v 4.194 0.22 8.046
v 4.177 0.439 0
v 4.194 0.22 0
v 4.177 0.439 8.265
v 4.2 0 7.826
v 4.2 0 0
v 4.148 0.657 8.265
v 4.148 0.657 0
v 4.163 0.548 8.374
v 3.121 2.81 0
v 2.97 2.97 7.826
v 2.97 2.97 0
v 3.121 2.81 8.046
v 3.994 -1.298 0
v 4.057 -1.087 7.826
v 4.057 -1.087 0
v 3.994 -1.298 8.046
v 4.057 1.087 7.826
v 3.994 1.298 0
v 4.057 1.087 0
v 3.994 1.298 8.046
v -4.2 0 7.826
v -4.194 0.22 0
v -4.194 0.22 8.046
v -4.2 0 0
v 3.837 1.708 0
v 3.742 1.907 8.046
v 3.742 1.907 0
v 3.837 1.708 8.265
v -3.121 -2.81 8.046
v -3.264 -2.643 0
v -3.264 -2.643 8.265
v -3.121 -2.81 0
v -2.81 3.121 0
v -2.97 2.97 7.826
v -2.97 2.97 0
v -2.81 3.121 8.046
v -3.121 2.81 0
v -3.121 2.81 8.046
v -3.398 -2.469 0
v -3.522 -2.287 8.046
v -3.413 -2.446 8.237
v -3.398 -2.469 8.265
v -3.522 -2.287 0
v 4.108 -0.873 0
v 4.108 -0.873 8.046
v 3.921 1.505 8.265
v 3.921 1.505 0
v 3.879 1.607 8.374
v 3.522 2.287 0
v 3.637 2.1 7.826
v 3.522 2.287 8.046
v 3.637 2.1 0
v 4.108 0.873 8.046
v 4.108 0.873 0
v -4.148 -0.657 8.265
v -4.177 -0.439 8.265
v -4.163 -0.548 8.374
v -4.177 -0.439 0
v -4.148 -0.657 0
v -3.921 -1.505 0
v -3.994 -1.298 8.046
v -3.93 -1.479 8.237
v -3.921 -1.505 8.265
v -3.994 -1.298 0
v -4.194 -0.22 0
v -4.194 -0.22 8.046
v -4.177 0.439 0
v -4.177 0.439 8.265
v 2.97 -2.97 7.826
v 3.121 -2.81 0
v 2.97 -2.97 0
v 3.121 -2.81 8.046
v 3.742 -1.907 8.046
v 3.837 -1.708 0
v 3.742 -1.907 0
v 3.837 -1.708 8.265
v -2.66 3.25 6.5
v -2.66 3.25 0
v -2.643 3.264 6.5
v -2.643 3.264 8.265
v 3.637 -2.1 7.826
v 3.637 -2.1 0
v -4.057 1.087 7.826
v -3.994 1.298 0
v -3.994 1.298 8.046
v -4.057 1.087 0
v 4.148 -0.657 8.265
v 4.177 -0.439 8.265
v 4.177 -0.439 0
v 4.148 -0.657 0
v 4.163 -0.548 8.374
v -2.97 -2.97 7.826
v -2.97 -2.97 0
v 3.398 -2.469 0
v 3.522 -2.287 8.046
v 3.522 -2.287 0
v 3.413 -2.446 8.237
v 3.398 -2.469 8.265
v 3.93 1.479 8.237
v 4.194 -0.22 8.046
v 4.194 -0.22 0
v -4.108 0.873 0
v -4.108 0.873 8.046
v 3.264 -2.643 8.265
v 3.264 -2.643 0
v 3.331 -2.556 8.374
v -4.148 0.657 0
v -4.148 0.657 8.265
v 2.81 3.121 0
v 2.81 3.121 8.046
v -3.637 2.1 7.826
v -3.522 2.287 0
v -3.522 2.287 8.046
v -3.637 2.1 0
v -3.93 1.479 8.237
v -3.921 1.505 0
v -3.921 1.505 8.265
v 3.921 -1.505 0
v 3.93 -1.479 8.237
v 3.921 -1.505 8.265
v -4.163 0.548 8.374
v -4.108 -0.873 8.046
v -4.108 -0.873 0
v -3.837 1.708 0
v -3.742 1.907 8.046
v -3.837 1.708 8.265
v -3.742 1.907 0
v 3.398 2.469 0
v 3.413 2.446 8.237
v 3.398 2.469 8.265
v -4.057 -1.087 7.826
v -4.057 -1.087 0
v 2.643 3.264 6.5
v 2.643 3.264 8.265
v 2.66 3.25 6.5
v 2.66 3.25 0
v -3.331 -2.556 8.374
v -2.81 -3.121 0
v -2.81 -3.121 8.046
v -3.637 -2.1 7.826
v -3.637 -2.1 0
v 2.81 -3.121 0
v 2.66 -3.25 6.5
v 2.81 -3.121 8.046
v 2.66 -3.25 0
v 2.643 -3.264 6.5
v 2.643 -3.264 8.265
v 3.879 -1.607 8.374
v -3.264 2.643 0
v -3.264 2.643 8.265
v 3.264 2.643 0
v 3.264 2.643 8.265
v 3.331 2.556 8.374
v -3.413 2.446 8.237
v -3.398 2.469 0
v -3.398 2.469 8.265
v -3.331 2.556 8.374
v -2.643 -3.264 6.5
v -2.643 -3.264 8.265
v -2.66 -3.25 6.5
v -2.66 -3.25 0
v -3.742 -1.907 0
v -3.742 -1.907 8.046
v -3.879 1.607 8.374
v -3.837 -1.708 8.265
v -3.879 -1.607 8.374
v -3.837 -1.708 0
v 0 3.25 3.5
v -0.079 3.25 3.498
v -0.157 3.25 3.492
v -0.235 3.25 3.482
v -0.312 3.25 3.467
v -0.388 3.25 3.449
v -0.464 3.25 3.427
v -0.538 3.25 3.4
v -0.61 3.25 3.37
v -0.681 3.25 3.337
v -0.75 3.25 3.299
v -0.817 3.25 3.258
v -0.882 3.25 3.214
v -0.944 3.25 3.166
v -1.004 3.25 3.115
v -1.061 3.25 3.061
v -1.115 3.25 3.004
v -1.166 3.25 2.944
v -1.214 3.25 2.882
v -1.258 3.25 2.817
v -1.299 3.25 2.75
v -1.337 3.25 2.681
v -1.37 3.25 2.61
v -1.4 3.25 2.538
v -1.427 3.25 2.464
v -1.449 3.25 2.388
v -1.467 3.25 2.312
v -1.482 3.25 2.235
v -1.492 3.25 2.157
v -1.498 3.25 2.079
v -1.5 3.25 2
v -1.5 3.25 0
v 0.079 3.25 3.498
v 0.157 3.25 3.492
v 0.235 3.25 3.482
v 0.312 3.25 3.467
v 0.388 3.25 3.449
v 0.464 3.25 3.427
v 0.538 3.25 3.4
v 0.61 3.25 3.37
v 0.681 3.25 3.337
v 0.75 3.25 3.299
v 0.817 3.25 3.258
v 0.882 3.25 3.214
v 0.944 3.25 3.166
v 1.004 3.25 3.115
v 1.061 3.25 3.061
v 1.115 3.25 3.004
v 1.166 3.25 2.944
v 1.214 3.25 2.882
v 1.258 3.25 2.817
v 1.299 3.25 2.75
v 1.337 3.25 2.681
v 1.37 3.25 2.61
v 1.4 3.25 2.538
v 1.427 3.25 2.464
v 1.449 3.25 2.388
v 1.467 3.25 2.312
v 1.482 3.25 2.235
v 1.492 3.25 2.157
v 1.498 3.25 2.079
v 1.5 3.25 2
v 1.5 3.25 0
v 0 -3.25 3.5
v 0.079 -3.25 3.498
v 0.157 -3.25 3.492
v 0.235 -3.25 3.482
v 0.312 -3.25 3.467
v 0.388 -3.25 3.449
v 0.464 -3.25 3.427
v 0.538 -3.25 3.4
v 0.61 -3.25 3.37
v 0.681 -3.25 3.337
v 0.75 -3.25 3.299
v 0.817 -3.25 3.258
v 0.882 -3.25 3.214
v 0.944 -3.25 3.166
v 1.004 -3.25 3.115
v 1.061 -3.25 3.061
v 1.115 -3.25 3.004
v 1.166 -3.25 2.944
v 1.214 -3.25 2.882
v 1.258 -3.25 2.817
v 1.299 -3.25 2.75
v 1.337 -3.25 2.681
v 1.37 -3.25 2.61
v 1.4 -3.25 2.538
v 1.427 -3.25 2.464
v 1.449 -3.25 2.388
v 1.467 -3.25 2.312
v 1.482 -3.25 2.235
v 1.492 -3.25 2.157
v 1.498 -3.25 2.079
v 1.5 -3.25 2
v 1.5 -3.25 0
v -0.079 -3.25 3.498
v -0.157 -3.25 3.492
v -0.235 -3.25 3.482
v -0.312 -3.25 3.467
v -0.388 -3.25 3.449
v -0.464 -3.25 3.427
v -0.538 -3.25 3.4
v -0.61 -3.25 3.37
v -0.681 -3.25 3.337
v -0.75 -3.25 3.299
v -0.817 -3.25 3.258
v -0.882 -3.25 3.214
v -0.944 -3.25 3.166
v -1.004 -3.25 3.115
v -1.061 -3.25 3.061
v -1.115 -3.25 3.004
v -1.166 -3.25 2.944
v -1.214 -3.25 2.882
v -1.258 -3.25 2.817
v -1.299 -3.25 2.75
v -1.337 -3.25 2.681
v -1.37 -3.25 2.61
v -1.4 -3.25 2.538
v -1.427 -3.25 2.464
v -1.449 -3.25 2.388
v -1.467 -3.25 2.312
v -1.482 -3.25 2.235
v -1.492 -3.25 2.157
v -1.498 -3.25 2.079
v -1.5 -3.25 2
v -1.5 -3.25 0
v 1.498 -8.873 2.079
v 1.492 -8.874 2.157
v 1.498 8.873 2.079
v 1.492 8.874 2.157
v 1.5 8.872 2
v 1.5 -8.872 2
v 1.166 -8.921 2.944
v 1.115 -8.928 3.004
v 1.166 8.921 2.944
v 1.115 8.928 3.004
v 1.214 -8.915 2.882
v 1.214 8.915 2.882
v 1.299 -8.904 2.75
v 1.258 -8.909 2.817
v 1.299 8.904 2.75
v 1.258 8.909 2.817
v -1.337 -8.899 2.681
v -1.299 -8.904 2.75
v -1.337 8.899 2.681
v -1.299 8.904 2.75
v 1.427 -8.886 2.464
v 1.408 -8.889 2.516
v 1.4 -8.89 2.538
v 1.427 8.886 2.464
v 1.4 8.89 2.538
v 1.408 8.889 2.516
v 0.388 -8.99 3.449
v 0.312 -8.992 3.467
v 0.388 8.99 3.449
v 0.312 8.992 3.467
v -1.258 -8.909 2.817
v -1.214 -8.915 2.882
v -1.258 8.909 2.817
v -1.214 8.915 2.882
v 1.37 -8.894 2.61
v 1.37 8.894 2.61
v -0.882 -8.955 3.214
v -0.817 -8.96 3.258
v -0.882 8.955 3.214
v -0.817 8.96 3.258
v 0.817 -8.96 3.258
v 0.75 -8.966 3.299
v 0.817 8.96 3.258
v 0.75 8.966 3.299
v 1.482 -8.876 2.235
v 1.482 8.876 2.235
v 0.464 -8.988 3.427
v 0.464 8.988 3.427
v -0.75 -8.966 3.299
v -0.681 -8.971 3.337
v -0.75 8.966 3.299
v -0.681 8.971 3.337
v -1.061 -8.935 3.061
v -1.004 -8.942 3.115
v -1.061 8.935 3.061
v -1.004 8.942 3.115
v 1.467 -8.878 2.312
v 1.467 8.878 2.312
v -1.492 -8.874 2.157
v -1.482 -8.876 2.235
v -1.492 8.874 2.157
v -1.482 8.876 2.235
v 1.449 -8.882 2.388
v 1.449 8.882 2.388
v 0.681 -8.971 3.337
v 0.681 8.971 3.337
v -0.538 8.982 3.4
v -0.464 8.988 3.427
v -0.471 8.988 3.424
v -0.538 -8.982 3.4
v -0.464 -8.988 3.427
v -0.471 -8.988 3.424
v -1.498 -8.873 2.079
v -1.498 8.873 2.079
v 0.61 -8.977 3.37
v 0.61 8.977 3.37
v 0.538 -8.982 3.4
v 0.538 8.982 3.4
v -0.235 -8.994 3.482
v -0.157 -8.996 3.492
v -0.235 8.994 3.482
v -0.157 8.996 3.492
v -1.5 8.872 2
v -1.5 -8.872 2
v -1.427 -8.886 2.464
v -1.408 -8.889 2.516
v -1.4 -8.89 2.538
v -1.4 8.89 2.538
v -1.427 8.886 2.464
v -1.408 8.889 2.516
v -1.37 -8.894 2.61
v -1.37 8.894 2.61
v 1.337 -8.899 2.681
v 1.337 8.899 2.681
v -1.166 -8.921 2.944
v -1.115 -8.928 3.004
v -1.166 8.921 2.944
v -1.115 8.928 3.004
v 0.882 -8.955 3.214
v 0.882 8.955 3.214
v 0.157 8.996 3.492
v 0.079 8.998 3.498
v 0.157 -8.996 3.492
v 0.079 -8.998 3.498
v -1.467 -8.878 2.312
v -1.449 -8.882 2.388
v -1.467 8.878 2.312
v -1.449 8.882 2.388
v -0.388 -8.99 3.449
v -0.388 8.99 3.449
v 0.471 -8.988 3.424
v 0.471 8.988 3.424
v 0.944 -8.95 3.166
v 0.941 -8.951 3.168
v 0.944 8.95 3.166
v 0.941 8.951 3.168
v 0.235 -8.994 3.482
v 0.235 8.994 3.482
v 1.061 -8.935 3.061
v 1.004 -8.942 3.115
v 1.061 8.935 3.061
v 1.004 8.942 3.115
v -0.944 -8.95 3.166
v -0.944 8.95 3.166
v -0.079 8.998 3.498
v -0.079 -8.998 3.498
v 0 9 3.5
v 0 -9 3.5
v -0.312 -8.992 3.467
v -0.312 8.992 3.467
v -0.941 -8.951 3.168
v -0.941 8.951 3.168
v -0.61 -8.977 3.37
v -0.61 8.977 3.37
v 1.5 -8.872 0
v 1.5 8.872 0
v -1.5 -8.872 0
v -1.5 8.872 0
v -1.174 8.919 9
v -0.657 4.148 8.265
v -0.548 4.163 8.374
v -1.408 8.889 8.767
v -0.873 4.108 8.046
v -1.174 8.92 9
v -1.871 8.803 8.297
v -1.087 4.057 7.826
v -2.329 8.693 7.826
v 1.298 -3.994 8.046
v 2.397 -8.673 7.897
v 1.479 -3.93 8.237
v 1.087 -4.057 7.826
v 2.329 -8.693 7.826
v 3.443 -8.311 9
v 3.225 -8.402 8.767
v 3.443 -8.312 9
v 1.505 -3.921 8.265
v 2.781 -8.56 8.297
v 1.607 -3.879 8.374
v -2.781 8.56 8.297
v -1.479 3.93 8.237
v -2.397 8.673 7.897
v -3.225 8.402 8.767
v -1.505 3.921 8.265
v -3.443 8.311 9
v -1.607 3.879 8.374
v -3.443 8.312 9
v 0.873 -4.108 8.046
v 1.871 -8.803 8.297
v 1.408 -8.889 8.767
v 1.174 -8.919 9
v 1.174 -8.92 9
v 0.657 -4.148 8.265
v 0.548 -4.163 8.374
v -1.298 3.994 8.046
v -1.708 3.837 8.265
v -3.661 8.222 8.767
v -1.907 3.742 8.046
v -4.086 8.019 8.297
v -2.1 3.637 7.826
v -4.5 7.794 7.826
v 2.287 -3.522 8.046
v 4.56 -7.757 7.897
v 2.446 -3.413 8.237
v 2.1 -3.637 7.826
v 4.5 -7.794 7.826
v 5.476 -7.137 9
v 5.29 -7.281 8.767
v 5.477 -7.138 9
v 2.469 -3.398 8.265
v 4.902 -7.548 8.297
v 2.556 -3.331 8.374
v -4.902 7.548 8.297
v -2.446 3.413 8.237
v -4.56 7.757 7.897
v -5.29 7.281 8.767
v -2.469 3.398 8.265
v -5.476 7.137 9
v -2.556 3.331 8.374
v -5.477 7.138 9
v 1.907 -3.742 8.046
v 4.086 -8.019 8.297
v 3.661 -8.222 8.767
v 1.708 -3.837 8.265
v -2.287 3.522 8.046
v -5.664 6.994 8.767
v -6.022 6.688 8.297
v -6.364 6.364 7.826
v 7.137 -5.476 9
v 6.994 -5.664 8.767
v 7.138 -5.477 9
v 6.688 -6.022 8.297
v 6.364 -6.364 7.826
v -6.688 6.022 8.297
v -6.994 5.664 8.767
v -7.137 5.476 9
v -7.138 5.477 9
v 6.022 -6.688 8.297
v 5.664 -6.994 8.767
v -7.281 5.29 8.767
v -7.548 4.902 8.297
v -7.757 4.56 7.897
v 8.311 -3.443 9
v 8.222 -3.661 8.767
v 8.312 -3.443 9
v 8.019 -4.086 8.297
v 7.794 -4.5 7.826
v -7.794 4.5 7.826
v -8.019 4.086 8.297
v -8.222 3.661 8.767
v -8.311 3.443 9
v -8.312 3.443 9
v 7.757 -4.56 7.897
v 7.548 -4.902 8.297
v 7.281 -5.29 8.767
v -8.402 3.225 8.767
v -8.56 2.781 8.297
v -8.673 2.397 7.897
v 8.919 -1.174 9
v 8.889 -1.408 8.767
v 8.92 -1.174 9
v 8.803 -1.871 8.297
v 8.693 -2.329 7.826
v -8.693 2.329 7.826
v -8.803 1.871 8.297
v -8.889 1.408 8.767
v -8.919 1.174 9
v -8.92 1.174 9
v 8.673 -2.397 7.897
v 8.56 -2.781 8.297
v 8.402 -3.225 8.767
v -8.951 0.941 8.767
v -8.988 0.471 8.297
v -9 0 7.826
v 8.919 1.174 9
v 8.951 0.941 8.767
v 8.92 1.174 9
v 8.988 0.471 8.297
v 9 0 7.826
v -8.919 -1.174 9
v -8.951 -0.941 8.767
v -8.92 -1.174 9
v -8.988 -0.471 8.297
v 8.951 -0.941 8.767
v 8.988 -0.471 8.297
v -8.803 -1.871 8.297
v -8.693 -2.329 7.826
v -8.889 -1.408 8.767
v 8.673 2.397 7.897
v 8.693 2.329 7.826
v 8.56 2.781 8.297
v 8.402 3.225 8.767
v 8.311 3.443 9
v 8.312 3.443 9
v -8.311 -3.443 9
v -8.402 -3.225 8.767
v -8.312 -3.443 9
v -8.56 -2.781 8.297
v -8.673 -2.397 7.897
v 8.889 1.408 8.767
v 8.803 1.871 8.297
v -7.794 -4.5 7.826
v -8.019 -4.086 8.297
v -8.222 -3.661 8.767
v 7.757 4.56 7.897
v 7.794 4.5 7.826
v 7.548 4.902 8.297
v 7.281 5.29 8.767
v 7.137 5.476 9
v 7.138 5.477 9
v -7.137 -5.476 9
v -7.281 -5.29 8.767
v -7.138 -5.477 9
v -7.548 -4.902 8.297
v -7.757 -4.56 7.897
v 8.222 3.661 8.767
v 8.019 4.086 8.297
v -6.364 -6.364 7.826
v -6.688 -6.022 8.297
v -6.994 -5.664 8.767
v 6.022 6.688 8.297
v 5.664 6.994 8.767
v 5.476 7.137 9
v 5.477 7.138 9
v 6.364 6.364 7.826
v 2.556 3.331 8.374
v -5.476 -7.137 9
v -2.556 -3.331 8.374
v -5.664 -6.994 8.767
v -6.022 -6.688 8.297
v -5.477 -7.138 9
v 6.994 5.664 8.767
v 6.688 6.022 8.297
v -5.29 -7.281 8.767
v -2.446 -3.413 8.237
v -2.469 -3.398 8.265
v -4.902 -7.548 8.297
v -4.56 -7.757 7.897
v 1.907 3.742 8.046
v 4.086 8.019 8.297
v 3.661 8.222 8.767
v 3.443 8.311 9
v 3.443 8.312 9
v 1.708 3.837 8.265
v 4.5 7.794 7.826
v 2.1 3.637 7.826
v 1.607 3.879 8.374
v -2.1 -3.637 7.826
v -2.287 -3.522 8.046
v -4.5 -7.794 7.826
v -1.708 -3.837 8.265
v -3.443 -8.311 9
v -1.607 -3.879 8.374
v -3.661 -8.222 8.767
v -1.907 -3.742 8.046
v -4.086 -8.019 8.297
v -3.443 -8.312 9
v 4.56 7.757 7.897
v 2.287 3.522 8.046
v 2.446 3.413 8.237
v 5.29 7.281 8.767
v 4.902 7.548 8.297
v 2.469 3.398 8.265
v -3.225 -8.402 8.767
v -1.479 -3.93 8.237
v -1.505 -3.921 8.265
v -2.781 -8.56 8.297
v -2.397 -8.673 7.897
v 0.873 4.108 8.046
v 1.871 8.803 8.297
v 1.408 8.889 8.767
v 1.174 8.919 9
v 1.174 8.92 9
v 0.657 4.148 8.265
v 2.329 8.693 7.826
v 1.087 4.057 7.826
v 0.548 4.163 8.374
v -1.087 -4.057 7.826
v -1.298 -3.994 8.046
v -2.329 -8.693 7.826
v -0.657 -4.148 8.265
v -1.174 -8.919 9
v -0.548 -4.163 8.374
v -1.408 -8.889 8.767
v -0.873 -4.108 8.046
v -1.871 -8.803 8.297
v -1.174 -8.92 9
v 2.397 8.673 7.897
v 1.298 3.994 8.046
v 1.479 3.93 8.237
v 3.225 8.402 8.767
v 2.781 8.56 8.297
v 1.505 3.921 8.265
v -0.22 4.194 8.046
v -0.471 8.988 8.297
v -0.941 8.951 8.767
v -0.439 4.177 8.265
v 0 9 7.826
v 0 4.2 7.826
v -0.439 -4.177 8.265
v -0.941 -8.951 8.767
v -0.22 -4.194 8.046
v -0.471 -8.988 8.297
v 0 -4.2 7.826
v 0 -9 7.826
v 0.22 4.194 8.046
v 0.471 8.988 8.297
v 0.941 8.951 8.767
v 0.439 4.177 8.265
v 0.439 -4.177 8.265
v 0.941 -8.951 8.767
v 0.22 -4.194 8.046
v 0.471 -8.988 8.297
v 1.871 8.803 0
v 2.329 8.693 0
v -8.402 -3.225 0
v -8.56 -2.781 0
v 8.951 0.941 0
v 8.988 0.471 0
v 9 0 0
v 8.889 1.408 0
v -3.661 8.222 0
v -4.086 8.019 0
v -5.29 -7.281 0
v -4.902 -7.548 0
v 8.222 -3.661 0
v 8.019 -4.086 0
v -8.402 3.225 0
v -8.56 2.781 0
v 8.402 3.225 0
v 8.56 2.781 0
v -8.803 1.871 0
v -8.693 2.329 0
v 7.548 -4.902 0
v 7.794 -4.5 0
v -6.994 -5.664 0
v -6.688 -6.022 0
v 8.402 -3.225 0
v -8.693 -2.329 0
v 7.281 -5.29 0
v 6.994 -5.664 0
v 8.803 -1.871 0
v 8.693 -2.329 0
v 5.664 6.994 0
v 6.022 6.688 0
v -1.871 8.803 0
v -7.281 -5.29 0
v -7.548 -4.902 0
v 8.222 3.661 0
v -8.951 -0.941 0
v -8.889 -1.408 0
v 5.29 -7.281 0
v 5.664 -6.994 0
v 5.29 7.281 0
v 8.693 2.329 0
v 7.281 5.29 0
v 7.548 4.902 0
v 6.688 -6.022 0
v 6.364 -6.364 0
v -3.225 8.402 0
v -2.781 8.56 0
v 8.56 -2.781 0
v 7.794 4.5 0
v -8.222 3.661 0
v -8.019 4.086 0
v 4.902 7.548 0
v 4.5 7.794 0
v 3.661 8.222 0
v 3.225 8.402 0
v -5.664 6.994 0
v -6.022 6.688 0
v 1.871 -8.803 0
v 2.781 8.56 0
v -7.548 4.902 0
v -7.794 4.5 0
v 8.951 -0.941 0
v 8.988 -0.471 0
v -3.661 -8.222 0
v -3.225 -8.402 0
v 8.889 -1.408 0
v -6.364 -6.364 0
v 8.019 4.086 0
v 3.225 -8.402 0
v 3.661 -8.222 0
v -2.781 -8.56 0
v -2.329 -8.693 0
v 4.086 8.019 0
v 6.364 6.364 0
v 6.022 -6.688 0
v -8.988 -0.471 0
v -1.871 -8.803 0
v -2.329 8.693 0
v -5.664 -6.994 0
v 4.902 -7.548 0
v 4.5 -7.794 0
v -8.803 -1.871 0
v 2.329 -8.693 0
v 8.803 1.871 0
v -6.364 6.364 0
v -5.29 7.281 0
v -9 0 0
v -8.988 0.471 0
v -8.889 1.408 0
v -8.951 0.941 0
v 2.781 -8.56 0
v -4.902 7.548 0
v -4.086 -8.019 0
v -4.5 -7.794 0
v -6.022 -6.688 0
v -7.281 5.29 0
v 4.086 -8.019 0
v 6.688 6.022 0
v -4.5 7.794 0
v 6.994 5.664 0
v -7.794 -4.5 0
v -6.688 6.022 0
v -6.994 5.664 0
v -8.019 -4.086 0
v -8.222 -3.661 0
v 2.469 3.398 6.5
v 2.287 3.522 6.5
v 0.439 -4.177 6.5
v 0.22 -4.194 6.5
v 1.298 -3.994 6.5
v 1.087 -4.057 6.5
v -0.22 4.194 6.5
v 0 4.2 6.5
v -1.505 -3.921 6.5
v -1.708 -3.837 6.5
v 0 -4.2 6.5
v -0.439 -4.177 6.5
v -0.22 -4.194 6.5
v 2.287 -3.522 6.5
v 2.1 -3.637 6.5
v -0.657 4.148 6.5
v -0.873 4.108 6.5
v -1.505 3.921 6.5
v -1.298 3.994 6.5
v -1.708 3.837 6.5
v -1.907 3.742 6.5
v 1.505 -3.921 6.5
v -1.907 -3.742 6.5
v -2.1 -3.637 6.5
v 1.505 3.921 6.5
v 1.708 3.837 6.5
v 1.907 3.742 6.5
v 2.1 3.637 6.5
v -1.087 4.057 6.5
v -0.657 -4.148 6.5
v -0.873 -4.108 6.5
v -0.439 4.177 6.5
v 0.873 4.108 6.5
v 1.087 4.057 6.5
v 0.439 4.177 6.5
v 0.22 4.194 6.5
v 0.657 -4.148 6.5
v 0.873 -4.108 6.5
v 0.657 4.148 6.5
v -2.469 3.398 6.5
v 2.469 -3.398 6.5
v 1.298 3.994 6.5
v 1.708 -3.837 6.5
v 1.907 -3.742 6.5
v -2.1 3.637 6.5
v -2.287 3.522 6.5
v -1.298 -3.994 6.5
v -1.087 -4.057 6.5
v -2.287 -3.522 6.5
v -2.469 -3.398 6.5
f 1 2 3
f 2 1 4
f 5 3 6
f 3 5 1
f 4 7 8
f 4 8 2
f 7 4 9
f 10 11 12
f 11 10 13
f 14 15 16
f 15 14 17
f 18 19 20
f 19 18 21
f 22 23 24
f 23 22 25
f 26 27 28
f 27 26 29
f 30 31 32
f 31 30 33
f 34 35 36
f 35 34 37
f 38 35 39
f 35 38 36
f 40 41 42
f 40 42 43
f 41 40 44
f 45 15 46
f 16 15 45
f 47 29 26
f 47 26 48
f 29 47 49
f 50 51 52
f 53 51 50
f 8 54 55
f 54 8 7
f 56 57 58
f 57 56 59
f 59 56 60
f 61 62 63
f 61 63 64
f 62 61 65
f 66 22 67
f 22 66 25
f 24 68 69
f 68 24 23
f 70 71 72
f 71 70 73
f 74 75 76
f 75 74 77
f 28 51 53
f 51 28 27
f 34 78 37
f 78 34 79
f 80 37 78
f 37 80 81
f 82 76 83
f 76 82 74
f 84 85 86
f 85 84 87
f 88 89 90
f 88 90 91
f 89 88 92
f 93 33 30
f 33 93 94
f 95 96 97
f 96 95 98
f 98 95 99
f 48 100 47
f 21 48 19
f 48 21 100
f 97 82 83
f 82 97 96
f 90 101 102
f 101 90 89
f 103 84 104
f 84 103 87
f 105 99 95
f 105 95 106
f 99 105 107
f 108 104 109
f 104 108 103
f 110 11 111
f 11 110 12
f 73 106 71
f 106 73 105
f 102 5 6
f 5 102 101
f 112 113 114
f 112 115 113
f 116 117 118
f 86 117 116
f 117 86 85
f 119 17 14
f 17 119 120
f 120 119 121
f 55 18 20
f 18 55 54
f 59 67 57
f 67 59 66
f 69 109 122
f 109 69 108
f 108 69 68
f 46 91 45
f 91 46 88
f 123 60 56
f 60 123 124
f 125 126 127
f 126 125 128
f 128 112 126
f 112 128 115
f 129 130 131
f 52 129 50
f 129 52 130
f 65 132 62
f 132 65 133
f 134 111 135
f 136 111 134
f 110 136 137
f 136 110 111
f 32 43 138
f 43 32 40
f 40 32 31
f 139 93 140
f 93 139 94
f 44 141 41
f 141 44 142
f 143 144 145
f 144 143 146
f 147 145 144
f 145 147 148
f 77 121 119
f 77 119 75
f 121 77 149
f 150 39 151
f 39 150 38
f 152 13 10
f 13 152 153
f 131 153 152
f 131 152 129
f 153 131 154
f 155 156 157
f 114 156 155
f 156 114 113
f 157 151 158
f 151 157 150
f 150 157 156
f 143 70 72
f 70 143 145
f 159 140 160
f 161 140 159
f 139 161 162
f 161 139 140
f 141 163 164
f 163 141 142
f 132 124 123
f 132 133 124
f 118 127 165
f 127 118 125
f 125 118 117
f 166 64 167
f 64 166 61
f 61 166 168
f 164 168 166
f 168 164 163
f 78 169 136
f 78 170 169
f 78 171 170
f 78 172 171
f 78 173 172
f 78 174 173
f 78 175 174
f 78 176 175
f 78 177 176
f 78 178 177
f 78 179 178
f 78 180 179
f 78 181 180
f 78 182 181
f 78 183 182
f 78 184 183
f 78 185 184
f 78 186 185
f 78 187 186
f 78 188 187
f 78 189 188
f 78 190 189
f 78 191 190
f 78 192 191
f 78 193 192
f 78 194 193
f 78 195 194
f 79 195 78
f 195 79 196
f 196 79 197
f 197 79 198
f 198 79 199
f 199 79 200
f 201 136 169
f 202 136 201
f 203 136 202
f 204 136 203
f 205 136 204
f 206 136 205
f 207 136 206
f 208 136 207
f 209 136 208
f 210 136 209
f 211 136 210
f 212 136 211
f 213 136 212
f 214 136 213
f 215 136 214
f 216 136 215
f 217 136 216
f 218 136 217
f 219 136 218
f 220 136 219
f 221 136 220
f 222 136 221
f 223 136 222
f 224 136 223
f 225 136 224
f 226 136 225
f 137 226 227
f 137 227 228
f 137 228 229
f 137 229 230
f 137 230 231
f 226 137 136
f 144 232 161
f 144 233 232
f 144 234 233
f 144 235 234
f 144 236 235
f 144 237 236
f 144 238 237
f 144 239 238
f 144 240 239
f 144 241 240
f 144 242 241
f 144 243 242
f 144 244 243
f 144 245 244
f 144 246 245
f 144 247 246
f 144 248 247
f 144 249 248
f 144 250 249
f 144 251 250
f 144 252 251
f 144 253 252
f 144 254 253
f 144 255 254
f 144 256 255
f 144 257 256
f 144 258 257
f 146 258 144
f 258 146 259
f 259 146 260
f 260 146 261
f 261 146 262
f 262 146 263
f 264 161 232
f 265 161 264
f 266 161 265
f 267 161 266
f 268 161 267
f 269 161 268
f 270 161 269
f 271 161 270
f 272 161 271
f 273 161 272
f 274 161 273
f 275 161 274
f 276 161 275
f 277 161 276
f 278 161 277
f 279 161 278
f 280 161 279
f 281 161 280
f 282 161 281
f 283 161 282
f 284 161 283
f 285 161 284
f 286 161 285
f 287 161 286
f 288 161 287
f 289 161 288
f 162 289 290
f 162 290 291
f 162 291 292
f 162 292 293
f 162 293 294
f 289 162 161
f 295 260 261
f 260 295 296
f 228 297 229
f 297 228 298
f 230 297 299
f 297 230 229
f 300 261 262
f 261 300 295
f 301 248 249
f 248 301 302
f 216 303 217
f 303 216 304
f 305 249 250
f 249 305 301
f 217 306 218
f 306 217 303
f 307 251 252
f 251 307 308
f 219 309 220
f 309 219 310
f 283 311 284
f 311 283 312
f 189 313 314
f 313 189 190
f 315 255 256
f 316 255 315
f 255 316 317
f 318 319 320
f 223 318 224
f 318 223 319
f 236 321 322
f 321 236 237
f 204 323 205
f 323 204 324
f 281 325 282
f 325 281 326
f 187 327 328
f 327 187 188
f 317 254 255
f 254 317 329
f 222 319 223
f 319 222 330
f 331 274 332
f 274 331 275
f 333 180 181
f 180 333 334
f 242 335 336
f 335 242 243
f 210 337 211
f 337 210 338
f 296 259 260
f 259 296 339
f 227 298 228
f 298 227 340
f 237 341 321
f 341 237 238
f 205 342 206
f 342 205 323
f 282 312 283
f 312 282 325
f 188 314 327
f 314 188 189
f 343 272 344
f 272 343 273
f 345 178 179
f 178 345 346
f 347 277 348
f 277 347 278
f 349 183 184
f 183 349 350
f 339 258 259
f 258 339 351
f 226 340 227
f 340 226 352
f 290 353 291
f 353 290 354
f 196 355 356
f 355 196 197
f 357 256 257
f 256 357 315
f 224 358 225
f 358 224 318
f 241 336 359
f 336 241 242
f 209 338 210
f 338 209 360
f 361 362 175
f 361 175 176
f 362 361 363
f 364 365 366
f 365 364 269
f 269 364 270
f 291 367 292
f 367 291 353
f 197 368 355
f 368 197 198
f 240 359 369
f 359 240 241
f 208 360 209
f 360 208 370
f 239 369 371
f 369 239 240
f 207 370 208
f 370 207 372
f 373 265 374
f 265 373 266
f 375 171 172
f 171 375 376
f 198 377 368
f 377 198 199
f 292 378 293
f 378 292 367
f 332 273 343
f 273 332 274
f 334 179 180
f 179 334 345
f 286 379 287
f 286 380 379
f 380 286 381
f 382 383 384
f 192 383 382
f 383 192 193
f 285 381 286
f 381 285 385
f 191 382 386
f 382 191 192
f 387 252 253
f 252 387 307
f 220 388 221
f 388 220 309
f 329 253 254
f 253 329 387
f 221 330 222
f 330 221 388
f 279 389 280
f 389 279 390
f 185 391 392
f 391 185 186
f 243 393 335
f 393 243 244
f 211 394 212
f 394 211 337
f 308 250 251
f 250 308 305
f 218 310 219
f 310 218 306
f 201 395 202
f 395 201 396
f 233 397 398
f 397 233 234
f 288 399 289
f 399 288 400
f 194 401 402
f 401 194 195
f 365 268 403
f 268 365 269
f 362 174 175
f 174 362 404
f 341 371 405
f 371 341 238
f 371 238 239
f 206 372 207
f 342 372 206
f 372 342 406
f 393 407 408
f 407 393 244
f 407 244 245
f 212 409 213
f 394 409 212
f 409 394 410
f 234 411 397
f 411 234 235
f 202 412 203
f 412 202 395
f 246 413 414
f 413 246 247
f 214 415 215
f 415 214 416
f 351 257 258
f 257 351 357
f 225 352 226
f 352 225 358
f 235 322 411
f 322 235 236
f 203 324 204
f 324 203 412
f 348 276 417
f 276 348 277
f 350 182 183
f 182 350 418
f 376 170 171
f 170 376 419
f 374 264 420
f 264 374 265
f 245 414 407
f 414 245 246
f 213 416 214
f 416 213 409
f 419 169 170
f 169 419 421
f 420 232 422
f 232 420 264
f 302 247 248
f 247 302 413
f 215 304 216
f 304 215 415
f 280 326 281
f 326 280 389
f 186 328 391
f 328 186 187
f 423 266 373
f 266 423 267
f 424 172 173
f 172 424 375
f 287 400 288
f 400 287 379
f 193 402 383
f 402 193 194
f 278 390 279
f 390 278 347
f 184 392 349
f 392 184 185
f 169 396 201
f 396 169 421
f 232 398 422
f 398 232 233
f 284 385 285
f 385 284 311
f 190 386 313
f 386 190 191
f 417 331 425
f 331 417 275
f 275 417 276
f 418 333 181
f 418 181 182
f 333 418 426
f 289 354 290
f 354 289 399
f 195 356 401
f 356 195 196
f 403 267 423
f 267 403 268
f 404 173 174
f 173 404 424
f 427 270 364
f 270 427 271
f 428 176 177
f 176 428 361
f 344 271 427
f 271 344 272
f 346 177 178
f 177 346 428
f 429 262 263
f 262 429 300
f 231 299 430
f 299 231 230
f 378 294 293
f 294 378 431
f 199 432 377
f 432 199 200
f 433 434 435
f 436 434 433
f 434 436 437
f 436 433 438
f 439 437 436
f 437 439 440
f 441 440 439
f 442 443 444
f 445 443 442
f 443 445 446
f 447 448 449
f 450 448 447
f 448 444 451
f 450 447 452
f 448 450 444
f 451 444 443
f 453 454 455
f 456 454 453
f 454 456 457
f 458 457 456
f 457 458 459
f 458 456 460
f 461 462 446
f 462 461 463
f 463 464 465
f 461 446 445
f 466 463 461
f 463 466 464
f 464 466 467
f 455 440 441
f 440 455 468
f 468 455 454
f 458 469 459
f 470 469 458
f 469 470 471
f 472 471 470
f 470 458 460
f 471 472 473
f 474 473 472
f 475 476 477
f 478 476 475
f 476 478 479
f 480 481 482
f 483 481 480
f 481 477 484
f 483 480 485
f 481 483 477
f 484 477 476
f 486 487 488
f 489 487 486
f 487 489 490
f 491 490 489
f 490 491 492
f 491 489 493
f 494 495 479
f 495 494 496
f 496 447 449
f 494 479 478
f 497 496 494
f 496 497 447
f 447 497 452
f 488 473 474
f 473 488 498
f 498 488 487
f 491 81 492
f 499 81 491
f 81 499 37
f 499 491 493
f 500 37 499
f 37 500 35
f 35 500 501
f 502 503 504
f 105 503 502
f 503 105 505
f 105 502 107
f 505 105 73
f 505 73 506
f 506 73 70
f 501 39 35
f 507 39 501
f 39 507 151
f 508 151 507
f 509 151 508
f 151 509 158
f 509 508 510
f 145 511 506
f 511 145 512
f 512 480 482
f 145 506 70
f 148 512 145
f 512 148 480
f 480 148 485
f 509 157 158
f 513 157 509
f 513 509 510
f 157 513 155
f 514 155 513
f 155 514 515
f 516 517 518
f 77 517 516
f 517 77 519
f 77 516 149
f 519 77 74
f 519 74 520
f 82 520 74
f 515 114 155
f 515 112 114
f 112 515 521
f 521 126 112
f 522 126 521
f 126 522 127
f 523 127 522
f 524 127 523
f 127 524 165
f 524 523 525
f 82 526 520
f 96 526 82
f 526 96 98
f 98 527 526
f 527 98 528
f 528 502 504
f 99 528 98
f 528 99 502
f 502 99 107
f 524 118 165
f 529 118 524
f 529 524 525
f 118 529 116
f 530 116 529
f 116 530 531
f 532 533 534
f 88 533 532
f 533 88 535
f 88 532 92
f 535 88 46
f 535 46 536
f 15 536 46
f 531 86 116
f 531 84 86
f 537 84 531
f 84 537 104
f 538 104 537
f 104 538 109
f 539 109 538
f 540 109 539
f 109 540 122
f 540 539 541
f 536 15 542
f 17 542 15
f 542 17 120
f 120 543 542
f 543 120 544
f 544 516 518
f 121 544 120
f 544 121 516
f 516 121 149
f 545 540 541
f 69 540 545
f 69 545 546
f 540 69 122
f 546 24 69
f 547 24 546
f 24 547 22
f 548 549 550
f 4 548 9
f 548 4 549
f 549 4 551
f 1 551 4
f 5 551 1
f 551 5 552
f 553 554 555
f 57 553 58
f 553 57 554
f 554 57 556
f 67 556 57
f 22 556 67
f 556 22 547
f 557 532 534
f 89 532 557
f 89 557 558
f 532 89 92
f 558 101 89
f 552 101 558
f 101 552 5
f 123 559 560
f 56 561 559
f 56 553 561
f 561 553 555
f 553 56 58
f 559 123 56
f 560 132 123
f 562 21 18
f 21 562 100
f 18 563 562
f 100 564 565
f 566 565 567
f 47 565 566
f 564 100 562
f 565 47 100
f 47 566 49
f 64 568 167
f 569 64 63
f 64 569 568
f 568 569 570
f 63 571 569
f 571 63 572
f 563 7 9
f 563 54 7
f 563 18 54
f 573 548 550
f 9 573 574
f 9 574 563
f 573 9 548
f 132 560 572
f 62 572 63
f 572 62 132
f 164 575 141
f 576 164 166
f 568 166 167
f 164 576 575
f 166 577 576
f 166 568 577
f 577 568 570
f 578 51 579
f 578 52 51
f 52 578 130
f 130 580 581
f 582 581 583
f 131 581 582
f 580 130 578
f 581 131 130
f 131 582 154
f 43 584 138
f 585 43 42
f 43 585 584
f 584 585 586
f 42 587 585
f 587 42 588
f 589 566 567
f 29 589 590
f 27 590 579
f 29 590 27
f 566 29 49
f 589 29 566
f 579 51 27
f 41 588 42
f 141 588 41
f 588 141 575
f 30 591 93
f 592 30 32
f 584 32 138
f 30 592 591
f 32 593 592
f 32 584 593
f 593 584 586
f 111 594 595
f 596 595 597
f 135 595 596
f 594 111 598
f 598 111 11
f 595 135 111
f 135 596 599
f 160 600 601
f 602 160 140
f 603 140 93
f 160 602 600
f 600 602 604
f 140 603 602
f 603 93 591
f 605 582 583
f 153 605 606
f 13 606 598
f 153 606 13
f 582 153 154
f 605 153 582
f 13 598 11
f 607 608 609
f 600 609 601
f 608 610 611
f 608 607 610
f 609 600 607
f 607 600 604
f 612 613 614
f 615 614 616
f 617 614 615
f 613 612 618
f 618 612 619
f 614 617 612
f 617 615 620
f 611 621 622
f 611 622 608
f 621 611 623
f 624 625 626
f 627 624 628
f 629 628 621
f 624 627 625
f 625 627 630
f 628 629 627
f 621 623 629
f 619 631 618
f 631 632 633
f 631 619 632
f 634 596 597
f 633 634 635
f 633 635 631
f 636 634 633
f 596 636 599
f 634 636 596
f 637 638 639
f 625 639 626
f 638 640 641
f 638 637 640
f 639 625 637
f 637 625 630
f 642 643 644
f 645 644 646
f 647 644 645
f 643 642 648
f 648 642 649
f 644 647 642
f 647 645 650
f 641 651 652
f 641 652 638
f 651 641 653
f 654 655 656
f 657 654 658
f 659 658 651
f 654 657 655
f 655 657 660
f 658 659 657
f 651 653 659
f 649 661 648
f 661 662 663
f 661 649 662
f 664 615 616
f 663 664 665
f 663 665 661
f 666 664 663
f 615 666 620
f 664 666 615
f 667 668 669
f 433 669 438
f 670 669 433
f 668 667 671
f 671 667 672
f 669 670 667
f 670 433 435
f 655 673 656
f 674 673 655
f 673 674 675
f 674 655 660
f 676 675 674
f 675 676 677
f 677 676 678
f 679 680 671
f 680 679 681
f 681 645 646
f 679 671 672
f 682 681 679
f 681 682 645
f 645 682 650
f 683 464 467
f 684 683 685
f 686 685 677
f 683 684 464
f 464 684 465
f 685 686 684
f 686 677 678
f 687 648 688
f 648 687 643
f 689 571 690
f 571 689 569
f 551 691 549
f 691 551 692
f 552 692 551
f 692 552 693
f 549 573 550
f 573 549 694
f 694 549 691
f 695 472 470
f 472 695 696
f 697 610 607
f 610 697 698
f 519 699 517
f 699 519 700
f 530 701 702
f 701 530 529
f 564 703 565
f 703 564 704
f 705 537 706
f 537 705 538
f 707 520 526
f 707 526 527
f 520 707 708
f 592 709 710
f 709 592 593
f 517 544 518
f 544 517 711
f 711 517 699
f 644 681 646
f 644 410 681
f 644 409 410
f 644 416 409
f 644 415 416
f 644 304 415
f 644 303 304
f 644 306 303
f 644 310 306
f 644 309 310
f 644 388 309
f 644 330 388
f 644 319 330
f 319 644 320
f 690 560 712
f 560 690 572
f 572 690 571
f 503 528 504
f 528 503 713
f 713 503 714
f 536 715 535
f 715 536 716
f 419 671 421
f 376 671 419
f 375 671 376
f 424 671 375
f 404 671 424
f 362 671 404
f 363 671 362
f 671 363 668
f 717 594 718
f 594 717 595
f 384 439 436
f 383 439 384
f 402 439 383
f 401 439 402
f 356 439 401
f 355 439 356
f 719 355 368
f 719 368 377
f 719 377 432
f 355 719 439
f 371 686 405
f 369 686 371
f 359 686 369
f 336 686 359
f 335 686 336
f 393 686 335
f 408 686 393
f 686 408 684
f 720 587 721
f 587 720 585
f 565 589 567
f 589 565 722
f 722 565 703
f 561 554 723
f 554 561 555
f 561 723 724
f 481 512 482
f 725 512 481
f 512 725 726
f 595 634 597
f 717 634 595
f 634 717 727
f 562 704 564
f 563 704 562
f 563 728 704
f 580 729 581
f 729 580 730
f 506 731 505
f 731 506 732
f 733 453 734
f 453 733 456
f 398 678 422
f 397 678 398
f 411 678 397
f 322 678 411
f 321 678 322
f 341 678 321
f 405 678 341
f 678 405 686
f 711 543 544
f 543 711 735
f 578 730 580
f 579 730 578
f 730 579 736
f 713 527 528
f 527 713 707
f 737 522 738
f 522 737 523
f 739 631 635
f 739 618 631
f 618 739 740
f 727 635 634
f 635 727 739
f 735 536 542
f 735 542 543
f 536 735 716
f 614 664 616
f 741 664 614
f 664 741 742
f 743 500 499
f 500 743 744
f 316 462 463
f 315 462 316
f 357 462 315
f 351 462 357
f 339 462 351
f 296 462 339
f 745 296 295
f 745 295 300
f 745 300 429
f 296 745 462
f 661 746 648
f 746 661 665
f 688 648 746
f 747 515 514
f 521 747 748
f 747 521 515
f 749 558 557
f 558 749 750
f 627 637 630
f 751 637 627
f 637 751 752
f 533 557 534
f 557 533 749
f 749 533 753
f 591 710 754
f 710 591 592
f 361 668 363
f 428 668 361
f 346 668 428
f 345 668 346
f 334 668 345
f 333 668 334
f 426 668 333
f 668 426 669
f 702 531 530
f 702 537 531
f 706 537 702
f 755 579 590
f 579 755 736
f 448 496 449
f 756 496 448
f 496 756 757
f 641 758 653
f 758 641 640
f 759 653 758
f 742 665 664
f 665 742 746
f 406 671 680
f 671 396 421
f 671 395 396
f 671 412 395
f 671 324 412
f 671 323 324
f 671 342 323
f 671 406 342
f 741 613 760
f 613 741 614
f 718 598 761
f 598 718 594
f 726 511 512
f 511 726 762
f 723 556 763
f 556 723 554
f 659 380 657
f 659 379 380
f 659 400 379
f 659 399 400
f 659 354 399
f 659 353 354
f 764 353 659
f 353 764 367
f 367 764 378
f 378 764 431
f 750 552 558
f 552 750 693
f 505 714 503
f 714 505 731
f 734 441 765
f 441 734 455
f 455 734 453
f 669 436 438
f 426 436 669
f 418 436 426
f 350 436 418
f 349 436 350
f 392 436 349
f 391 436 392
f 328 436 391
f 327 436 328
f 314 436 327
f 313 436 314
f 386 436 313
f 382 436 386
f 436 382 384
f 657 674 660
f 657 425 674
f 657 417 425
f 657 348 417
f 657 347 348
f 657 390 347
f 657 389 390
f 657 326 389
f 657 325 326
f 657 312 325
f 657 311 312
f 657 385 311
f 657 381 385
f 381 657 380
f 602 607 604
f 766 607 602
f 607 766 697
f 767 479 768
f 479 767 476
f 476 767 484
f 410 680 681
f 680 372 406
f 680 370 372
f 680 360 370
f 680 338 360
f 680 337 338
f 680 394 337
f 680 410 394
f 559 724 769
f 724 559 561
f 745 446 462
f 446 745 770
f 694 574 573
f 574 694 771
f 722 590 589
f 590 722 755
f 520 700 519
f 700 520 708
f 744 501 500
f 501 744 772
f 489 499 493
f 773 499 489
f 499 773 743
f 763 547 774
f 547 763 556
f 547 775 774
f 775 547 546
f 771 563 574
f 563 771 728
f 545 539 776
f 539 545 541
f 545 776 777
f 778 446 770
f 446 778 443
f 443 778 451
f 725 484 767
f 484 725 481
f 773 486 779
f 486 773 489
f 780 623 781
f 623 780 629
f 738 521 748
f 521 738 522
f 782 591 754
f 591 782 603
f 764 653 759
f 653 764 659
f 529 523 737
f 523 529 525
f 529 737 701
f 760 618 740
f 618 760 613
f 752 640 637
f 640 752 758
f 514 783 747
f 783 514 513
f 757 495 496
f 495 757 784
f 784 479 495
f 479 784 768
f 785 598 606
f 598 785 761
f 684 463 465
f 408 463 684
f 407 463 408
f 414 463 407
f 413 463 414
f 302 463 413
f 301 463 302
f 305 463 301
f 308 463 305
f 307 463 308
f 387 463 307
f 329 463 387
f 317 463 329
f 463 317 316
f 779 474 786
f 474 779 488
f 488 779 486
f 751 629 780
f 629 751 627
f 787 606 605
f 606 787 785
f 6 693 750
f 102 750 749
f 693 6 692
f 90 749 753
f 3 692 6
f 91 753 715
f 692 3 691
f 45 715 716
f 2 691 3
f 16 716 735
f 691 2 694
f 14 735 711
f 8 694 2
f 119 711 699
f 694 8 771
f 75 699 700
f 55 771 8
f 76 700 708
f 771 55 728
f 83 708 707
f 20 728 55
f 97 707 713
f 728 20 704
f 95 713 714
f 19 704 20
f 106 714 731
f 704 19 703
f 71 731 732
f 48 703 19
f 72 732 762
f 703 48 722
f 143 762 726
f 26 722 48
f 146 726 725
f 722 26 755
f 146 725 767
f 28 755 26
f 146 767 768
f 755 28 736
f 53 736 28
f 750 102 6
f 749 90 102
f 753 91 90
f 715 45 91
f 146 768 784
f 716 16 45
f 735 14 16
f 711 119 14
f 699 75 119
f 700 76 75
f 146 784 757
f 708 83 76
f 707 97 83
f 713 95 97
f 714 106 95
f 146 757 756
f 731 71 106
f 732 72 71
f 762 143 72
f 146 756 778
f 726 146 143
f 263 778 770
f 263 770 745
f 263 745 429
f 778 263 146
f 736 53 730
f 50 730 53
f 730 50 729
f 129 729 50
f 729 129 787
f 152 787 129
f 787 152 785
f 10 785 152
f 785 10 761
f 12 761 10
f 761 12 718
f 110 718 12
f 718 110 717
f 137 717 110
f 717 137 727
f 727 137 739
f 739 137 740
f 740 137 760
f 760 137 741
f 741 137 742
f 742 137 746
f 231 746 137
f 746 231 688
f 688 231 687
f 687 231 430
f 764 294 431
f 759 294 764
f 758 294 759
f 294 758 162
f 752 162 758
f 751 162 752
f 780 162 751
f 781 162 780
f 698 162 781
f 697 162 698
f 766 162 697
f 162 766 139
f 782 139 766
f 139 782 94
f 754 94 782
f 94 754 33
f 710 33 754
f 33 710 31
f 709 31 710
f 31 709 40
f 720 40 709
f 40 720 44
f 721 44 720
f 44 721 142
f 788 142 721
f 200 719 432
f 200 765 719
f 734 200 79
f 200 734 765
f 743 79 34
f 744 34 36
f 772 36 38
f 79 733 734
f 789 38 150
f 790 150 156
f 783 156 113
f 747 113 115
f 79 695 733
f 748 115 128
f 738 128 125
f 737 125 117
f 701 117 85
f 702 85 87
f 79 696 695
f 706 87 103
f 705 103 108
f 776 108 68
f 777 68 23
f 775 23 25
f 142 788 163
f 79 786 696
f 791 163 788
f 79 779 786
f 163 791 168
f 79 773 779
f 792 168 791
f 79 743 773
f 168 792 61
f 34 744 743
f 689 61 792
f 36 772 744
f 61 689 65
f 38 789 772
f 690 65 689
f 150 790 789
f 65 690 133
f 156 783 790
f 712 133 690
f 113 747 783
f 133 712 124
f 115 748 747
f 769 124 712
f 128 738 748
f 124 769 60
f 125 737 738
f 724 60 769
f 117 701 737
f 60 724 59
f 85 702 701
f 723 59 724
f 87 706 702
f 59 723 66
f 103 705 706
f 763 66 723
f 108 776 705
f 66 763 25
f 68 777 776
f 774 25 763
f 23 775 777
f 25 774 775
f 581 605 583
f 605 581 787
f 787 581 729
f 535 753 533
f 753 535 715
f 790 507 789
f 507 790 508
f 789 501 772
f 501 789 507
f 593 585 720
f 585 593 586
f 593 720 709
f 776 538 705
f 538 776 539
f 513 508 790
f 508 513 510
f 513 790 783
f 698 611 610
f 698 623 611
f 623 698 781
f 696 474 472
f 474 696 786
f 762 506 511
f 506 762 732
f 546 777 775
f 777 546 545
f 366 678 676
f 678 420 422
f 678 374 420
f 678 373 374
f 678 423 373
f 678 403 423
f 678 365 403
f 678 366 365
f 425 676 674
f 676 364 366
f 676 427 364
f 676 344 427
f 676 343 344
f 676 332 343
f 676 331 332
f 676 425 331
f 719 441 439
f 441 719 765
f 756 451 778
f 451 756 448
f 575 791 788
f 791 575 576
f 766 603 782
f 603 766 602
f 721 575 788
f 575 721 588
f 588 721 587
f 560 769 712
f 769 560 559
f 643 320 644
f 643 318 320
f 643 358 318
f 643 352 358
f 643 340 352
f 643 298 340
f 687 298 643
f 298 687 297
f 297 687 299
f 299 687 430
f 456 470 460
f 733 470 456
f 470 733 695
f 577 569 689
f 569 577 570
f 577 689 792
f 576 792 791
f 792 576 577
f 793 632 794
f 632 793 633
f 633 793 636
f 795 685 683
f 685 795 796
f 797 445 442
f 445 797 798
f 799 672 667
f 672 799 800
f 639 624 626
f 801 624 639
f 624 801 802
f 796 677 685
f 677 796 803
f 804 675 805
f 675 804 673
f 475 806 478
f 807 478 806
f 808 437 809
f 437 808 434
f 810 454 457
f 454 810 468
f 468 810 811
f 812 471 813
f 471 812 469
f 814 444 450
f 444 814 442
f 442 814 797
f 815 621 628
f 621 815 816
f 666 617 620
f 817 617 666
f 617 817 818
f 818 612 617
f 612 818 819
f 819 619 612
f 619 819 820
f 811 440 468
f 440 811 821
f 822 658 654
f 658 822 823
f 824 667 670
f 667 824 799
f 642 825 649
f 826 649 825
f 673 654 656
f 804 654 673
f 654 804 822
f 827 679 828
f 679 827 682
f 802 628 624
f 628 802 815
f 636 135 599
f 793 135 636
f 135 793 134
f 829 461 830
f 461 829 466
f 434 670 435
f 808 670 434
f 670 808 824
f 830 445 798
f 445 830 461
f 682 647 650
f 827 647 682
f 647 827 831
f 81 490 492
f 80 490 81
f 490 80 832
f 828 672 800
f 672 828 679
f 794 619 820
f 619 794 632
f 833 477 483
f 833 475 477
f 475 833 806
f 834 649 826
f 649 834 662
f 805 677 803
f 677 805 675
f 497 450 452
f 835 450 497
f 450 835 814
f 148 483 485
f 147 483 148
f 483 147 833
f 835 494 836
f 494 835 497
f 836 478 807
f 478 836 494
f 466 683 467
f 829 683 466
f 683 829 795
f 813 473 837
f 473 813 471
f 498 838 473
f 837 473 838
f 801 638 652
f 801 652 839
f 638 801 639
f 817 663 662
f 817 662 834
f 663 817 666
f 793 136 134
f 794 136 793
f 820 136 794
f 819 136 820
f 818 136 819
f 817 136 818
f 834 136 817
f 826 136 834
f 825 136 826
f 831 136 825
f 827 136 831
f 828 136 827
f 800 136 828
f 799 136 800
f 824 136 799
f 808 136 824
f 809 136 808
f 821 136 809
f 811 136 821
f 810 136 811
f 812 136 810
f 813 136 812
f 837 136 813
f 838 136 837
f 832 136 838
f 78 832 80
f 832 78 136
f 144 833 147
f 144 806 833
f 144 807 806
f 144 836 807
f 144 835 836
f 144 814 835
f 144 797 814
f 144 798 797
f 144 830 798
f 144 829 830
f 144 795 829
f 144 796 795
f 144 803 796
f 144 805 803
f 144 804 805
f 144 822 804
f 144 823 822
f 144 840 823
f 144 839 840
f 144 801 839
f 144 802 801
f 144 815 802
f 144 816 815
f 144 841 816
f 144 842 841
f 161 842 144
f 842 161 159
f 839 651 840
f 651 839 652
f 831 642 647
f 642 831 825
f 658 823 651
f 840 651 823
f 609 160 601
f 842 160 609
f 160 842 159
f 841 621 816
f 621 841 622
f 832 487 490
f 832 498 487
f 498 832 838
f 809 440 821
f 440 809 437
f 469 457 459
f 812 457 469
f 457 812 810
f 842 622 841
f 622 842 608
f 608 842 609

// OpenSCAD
/* * * * * * * * * * * * * * * * * * * * * * * * * * * * * * * * * * * * *\
 * Copyright (C) Claus Schrammel <claus@f05fk.net>                       *
 *                                                                       *
 * This program is free software: you can redistribute it and/or modify  *
 * it under the terms of the GNU General Public License as published by  *
 * the Free Software Foundation, either version 3 of the License, or     *
 * (at your option) any later version.                                   *
 *                                                                       *
 * This program is distributed in the hope that it will be useful,       *
 * but WITHOUT ANY WARRANTY; without even the implied warranty of        *
 * MERCHANTABILITY or FITNESS FOR A PARTICULAR PURPOSE.  See the         *
 * GNU General Public License for more details.                          *
 *                                                                       *
 * You should have received a copy of the GNU General Public License     *
 * along with this program.  If not, see <http://www.gnu.org/licenses/>. *
 *                                                                       *
 * SPDX-License-Identifier: GPL-3.0-or-later                             *
\* * * * * * * * * * * * * * * * * * * * * * * * * * * * * * * * * * * * */
$fn = 120;

difference() {
    cylinder(h = 9, d = 18);

    translate([0, 0, 8]) cylinder(h = 3, d = 8.4, center = true);

    translate([0, 0, 5])
    intersection() {
        cylinder(h = 12, d = 8.4, center = true);
        cube([10, 6.5, 12], center = true);
    }

    translate([0, 0, 2]) {
        rotate([90, 0, 0]) cylinder(h = 20, d = 3, center = true);
        translate([0, 0, -4]) cube([3, 20, 8], center = true);
    }

    for (i = [15:15:360])
        translate([0, 0, 9.24])
            rotate([0, 45, i])
            cube([2, 20, 2], center = true);

}
